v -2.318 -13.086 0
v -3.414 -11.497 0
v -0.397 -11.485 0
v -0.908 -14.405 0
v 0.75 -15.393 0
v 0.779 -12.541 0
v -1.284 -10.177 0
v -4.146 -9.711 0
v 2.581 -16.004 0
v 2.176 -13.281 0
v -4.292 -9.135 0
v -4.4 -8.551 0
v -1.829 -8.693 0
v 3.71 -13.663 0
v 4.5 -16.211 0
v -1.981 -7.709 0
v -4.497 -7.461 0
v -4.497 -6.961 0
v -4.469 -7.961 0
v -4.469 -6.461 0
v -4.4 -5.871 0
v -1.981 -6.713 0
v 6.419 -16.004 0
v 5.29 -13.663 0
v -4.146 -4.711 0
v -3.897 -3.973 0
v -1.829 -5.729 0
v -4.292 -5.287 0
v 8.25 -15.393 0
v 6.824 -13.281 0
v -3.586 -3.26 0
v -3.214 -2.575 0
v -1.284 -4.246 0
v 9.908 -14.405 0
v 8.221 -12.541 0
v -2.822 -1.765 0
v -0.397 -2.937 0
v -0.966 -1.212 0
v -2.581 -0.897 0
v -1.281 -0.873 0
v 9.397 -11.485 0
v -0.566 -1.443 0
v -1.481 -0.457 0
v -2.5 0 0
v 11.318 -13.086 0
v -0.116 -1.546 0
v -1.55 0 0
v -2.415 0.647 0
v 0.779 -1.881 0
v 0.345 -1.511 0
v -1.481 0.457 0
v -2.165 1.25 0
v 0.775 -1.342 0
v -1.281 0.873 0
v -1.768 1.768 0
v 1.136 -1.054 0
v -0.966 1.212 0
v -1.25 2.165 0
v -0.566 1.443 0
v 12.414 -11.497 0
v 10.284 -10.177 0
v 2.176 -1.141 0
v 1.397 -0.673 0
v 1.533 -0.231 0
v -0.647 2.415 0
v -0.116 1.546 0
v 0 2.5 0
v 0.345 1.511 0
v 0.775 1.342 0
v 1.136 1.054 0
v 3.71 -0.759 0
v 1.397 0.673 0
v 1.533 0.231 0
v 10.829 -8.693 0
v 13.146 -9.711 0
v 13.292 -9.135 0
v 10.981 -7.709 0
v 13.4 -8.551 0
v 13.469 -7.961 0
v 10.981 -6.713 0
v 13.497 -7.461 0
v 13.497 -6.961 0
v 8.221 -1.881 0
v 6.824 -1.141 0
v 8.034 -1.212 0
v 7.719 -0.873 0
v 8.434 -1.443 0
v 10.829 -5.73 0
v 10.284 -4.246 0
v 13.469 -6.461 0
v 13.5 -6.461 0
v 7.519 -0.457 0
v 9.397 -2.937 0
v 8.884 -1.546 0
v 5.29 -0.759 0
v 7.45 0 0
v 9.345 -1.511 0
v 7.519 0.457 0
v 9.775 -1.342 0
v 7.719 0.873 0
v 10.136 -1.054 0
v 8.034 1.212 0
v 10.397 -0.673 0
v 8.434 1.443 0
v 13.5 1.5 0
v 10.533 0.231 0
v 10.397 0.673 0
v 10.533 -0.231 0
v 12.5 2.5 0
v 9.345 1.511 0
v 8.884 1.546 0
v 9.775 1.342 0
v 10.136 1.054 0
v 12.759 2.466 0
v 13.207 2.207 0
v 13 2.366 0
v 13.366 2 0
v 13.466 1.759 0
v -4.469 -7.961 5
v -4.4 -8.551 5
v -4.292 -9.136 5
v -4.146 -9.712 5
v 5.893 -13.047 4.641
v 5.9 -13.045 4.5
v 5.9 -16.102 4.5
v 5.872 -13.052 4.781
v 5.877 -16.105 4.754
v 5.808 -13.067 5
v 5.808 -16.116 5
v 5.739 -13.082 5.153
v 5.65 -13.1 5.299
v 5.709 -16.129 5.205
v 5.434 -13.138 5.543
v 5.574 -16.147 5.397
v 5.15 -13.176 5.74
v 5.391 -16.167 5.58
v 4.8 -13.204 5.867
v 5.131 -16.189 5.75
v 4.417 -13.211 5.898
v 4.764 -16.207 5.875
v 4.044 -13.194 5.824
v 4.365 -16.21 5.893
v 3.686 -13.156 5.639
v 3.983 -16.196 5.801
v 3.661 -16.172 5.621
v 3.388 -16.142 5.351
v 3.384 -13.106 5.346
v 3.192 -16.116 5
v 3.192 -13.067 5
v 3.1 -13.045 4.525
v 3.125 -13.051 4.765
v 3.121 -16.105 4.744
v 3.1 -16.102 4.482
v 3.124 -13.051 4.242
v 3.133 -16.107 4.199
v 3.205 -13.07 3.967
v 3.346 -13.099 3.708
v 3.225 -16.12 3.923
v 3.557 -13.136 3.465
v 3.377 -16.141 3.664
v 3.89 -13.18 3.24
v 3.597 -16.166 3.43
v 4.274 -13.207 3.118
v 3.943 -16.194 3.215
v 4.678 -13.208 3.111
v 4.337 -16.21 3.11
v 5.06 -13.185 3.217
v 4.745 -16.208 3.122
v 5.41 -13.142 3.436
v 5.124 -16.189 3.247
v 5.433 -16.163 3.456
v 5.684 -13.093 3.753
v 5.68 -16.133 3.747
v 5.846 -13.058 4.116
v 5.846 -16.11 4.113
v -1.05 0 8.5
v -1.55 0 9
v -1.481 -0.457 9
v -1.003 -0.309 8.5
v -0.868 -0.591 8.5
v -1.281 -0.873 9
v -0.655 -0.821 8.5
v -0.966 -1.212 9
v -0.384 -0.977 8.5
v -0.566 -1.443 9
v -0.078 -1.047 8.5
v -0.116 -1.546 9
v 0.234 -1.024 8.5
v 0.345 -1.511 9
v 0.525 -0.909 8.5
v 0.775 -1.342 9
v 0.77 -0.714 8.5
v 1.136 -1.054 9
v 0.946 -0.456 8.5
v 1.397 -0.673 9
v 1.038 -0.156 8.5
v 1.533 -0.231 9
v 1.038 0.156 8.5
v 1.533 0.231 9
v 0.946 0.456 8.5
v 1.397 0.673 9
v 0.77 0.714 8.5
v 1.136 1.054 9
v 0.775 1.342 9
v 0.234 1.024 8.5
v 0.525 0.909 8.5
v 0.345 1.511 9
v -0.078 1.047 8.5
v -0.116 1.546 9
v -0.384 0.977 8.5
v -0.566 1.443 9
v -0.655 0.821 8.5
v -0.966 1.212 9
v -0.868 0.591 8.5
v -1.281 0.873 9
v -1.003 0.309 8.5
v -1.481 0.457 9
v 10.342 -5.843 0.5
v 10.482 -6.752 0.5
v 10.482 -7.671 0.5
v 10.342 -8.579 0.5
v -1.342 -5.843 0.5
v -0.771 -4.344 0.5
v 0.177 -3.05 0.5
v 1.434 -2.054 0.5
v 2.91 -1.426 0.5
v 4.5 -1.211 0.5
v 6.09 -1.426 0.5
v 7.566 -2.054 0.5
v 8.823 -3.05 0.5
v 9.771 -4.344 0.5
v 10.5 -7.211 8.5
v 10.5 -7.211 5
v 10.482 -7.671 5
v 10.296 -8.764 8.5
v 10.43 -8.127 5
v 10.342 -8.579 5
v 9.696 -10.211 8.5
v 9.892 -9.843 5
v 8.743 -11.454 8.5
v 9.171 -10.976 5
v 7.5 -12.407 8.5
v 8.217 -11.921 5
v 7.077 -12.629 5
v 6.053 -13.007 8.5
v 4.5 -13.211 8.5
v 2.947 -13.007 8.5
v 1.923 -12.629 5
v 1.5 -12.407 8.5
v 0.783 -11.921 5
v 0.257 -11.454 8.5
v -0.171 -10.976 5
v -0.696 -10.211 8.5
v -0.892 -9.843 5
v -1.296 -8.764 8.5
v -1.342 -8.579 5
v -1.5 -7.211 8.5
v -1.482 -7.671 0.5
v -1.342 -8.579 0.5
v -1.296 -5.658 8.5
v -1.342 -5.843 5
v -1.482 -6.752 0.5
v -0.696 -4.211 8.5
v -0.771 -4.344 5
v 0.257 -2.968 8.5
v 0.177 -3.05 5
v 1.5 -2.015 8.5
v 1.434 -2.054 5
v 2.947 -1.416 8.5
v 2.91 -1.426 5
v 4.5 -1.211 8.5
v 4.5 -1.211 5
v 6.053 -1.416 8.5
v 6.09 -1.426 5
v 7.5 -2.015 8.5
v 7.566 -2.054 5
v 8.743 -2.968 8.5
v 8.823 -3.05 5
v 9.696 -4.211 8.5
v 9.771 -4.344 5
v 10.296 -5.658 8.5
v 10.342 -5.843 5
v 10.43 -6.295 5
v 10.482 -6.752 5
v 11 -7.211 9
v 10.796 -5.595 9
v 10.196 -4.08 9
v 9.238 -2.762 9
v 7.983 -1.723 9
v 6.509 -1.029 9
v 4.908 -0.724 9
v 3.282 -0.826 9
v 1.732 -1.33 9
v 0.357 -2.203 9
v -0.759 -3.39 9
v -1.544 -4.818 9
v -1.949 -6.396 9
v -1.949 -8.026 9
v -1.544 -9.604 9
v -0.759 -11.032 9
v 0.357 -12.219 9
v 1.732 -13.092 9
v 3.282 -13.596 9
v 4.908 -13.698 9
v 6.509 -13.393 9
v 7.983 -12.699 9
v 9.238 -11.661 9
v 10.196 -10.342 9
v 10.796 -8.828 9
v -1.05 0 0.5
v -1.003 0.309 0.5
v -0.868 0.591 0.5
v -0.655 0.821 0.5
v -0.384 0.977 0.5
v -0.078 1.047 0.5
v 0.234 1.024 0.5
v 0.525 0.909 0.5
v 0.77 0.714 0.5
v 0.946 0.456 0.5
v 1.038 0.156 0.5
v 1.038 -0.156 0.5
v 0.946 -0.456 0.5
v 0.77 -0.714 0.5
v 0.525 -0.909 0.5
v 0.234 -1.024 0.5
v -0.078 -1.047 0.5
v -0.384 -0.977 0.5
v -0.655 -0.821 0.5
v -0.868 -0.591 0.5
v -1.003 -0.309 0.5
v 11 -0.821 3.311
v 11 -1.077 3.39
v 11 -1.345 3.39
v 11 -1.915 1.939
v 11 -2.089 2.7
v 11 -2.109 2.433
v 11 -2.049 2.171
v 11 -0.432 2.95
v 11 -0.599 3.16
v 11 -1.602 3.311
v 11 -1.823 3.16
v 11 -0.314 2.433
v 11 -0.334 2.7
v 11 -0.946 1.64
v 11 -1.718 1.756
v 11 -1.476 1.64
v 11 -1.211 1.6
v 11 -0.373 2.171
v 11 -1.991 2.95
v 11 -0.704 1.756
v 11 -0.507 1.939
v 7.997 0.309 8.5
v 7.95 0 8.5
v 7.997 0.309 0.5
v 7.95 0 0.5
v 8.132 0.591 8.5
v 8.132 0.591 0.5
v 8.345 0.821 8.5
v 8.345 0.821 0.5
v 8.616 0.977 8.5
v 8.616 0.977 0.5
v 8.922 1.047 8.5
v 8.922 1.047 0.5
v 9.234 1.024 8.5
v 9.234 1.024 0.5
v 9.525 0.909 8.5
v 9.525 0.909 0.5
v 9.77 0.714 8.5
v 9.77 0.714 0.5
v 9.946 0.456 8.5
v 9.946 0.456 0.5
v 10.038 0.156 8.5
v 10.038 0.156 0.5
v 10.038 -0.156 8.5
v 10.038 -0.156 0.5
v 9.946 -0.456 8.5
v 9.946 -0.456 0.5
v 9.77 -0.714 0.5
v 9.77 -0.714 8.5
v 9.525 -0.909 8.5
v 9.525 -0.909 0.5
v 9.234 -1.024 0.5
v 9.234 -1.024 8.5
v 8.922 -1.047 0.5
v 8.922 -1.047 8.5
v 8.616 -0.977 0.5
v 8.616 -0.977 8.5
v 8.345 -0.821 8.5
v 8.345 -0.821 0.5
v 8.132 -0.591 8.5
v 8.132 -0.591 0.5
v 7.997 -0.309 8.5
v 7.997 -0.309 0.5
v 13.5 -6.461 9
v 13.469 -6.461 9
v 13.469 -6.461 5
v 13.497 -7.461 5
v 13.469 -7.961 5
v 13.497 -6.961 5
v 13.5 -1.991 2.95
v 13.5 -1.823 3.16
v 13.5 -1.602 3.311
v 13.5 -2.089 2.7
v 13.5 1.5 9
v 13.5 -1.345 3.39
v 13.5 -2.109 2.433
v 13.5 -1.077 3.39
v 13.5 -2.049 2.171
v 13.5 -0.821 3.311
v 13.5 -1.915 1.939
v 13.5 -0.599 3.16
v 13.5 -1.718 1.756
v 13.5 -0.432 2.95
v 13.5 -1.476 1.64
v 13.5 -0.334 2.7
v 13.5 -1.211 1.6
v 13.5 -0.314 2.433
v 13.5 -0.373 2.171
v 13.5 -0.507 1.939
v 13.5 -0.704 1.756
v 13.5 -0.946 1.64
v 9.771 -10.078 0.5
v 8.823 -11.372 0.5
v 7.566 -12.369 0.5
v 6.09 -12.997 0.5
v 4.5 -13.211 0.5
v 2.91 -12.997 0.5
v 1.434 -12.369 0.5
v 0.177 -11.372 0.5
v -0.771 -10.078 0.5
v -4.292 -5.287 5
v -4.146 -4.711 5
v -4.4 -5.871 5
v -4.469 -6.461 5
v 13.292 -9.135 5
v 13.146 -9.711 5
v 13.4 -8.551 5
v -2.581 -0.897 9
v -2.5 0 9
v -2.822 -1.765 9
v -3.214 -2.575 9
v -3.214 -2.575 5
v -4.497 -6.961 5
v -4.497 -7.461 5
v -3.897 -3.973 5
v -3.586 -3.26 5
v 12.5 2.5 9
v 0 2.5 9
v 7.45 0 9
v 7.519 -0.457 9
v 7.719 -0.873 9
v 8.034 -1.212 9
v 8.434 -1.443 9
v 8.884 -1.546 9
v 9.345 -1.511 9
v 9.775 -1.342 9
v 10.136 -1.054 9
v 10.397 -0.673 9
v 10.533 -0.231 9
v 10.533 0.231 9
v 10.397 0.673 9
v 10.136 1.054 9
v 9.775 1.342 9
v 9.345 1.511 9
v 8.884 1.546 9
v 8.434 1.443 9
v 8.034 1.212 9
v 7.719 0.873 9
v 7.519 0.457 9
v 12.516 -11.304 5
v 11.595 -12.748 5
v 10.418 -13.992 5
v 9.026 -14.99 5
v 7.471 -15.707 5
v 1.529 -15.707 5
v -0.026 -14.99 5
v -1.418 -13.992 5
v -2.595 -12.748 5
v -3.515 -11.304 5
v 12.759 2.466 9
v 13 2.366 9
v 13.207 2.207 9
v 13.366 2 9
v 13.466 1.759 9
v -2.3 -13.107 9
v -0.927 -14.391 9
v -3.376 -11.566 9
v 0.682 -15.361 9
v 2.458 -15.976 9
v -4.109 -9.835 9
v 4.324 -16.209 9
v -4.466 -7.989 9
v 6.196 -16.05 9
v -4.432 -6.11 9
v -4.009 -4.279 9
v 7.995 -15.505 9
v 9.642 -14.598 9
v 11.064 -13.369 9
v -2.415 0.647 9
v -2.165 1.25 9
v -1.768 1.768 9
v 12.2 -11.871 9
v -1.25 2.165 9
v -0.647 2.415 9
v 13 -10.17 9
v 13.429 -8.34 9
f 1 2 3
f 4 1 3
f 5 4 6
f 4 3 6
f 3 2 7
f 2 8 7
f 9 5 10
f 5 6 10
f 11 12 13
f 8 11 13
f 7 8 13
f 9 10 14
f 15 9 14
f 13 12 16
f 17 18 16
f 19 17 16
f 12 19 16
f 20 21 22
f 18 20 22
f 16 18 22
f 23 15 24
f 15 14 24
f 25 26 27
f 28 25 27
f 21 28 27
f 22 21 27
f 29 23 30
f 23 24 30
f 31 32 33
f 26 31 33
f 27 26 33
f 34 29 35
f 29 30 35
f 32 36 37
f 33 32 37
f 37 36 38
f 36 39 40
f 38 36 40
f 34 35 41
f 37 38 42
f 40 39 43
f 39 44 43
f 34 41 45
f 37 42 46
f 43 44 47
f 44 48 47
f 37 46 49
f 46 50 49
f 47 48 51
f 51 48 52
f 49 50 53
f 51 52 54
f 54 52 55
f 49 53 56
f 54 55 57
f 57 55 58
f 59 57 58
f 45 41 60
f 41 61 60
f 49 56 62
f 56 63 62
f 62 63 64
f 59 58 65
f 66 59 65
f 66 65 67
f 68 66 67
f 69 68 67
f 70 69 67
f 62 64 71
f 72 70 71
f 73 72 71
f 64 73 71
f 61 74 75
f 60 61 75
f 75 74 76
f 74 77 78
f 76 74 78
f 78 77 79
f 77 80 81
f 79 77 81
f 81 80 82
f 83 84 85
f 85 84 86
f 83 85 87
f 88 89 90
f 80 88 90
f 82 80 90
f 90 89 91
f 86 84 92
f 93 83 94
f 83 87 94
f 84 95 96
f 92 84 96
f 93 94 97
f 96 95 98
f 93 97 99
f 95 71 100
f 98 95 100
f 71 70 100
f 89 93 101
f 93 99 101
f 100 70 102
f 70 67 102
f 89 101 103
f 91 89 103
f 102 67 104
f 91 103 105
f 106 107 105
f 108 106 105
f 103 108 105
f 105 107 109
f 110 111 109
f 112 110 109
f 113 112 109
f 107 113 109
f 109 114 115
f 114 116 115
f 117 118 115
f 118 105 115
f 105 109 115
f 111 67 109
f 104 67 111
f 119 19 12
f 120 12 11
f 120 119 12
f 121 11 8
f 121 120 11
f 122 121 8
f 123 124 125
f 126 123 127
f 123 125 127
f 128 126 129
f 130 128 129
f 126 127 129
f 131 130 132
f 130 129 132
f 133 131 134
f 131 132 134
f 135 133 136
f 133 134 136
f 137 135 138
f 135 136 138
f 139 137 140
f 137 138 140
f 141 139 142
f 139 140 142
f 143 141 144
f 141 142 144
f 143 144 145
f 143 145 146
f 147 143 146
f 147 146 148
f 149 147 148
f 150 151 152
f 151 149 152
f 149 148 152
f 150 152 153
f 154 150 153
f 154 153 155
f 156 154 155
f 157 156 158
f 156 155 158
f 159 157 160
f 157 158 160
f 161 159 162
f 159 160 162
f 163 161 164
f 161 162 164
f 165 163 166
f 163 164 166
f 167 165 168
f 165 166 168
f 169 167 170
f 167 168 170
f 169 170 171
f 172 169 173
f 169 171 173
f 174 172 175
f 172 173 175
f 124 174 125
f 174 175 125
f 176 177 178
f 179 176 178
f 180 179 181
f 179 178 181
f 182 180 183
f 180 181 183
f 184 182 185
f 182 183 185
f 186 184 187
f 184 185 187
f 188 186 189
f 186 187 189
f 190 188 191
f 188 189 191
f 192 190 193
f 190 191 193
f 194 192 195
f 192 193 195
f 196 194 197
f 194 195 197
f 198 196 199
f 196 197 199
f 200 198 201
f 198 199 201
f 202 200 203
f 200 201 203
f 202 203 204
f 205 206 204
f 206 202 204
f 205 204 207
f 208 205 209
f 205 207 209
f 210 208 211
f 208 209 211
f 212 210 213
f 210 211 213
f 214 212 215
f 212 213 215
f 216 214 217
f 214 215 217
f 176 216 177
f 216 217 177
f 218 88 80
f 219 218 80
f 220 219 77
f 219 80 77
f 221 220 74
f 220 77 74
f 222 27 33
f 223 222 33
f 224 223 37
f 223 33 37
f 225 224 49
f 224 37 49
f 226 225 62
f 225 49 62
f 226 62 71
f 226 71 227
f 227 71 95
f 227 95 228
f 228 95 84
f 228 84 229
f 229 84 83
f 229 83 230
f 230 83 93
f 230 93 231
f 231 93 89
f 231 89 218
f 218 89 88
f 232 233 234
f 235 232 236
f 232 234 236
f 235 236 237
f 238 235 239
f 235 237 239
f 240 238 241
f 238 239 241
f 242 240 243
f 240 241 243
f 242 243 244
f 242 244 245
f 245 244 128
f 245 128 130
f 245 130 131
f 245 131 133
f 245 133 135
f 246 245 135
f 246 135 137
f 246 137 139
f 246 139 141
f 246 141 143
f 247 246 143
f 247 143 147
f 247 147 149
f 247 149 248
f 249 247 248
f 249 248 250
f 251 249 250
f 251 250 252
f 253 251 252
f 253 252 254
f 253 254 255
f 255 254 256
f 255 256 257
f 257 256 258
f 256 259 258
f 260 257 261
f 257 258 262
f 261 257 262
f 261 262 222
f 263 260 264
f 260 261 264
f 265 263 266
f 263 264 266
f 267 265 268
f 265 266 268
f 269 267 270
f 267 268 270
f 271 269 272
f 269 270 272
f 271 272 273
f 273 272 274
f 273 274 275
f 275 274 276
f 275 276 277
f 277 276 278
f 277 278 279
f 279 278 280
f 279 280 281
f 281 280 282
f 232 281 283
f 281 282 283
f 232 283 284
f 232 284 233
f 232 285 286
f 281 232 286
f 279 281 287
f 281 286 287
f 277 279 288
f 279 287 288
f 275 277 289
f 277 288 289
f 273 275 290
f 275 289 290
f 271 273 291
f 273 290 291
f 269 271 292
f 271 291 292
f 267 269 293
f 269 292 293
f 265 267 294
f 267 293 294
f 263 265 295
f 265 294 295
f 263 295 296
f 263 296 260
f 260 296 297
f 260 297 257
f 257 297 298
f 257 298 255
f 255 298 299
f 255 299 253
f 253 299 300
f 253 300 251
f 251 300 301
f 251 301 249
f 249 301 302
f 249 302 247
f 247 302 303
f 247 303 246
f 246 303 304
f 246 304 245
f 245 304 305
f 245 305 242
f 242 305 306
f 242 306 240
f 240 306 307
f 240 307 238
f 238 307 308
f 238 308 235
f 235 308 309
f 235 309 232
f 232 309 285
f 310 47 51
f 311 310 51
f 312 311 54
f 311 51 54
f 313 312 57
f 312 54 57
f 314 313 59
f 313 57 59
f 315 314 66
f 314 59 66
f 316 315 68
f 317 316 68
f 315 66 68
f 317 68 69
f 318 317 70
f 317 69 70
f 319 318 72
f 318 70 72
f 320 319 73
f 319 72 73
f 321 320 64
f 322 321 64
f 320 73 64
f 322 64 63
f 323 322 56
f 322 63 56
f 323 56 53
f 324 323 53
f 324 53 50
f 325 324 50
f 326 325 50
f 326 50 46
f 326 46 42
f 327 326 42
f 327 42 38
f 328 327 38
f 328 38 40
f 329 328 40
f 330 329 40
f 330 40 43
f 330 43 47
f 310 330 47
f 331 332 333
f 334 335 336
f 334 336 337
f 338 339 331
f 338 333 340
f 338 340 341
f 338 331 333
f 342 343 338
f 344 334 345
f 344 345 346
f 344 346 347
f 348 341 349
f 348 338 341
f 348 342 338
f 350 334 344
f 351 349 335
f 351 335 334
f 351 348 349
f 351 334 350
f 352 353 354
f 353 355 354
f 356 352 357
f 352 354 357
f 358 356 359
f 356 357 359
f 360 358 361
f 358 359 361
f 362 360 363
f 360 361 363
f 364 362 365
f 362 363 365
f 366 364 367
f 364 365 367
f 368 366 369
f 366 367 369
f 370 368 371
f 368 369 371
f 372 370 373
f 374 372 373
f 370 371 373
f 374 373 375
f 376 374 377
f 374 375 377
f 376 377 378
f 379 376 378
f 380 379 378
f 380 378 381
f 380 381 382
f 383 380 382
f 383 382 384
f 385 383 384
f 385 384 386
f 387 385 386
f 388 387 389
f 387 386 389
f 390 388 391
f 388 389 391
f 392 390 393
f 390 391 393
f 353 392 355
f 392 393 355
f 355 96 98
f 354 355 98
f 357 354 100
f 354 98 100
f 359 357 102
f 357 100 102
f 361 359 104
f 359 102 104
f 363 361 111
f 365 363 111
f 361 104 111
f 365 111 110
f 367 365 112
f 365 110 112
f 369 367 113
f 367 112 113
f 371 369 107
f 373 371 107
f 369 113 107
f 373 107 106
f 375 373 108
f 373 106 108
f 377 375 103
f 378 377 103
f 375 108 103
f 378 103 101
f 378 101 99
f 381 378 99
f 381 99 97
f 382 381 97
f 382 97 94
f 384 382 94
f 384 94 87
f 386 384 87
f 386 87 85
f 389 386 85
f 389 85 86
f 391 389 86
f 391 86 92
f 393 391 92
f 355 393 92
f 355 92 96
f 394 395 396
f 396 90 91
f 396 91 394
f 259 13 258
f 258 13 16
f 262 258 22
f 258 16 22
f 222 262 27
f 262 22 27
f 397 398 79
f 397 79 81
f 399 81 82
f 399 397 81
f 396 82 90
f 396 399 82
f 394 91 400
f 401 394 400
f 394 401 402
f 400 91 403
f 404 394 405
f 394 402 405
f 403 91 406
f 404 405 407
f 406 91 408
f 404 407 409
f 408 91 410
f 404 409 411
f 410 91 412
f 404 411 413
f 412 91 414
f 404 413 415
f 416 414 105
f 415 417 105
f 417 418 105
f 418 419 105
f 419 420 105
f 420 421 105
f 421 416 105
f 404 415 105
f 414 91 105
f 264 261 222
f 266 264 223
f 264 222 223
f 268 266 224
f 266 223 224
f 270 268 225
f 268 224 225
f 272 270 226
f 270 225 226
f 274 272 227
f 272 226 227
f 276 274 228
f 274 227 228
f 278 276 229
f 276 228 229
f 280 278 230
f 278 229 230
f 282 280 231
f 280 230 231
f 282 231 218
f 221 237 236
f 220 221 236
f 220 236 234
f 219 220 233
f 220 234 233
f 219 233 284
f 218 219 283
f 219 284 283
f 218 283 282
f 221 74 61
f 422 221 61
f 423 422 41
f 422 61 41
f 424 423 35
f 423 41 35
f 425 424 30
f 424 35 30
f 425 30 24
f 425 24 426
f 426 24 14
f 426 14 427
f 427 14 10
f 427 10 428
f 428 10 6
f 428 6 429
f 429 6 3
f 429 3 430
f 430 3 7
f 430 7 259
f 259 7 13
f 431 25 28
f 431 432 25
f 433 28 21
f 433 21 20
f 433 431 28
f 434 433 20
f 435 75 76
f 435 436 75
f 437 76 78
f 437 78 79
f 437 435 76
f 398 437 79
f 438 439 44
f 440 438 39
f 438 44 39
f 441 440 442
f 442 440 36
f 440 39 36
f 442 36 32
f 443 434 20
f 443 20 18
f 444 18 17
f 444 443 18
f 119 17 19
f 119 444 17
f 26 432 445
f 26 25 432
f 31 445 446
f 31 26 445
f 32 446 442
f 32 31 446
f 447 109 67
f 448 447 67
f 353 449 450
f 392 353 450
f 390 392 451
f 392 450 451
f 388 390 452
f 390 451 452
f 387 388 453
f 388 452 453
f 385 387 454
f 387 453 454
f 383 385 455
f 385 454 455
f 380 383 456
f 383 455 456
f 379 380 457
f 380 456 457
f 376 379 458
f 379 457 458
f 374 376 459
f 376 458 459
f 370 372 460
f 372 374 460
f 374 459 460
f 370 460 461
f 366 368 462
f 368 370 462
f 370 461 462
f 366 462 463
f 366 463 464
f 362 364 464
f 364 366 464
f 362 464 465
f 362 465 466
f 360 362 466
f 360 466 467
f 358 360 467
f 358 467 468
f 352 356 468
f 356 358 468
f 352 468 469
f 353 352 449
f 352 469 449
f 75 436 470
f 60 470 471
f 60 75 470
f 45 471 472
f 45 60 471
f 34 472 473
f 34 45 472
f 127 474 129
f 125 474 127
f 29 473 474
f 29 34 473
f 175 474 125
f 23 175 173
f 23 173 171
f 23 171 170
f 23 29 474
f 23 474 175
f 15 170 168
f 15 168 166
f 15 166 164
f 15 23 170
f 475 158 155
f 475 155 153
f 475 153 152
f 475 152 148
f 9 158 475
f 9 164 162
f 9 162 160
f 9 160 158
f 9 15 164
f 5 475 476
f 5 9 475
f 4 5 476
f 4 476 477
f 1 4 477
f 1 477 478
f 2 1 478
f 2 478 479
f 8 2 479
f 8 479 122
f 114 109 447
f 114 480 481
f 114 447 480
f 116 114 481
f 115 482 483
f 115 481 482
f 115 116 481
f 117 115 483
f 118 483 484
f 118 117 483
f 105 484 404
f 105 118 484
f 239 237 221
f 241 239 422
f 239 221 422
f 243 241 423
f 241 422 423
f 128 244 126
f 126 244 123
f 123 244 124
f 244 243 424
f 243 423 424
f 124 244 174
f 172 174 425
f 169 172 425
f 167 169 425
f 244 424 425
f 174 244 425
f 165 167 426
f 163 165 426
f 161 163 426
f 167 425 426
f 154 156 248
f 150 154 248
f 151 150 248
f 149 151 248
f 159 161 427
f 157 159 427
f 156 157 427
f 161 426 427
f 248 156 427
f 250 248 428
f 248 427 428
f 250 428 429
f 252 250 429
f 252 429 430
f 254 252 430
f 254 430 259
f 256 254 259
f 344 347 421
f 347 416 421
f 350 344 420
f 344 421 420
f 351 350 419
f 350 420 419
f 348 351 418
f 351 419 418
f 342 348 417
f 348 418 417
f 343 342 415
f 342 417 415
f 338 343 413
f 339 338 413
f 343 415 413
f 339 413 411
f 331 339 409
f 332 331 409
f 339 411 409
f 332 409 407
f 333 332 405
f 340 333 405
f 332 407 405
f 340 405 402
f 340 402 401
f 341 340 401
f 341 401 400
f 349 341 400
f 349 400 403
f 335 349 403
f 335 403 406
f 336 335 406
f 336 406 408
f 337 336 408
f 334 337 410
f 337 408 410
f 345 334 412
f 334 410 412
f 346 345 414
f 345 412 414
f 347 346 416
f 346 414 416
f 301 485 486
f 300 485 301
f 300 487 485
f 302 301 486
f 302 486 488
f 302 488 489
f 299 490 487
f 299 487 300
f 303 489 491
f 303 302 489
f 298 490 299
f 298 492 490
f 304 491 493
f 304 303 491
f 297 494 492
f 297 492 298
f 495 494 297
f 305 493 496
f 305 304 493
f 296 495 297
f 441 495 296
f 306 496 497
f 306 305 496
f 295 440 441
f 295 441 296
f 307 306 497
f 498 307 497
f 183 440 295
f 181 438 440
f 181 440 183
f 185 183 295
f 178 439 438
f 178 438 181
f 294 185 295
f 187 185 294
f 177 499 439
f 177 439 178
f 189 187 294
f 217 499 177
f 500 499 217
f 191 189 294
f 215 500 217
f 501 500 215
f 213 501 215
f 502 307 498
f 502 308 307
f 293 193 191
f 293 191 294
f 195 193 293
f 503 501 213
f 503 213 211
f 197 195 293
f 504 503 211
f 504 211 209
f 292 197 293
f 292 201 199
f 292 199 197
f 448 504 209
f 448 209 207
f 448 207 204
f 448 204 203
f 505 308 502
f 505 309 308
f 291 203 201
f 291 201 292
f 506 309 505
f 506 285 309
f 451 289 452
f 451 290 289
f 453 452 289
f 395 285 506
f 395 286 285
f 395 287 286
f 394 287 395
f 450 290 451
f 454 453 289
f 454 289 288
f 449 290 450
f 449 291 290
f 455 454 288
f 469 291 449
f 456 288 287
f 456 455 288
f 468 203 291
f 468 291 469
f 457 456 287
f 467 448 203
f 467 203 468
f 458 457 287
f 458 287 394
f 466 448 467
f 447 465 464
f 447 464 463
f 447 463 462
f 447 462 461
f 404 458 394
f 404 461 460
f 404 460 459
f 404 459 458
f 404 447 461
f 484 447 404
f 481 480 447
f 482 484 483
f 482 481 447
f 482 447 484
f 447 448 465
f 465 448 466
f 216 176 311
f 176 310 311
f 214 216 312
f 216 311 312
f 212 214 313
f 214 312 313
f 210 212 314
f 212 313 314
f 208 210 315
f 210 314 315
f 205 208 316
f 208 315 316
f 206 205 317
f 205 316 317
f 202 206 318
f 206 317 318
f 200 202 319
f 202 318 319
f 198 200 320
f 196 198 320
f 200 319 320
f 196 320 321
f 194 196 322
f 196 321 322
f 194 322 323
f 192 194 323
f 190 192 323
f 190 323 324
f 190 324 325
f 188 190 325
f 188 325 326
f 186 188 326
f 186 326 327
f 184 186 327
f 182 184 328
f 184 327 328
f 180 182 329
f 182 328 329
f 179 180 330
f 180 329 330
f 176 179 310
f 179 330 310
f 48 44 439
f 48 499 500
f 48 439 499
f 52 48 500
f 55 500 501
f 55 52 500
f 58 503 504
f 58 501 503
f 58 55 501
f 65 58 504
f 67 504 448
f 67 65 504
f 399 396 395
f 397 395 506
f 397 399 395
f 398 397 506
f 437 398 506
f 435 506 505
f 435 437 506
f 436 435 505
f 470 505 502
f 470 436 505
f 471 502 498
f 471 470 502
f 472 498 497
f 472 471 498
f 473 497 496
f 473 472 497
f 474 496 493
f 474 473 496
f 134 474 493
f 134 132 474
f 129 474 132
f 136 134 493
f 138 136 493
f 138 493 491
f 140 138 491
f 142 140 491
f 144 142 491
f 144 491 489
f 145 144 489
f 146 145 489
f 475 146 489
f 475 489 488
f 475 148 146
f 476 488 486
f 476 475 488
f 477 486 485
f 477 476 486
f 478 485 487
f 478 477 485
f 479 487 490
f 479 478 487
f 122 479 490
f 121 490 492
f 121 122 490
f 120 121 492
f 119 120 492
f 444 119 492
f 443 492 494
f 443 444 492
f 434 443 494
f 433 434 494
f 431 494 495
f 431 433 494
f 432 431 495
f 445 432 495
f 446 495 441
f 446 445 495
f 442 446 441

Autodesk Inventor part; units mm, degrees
ref_plane "YZ Plane" through (0, 0, 0) normal (1, 0, 0) x (0, 1, 0)
ref_plane "XZ Plane" through (0, 0, 0) normal (0, 1, 0) x (-1, 0, 0)
sketch "Sketch1" plane through (0, 0, 0) normal (0, 0, 1) x (1, 0, 0)
  circle A0 centre (9, 0) radius 1
  circle A1 centre (0, 0) radius 1
  line L0 (0, 2.5) -> (9, 2.5)
  arc A2 (0, 2.5) -> (-2.5, 0) centre (0, 0) ccw
  arc A3 (11.5, 0) -> (9, 2.5) centre (9, 0) ccw
  arc A4 (-3.2143, -2.5754) -> (-2.5, 0) centre (-7.5, 0) ccw
  arc A5 (11.5, 0) -> (12.2143, -2.5754) centre (16.5, 0) ccw
  arc A6 (-3.2143, -2.5754) -> (-4.1458, -4.7111) centre (4.5, -7.2111) ccw
  line L1 (-8.5, -4.7111) -> (-4.1458, -4.7111)
  line L2 (13.1458, -4.7111) -> (17.5, -4.7111)
  line L3 (17.5, -9.7111) -> (13.1458, -9.7111)
  line L4 (-4.1458, -9.7111) -> (-8.5, -9.7111)
  line L5 (17.5, -7.9611) -> (10.4529, -7.9611)
  line L6 (-1.4529, -7.9611) -> (-8.5, -7.9611)
  line L7 (-8.5, -6.4611) -> (-1.4529, -6.4611)
  line L8 (10.4529, -6.4611) -> (17.5, -6.4611)
  arc A7 (-4.1458, -9.7111) -> (13.1458, -9.7111) centre (4.5, -7.2111) ccw
  arc A8 (13.1458, -4.7111) -> (12.2143, -2.5754) centre (4.5, -7.2111) ccw
  arc A9 (-1.4529, -7.9611) -> (10.4529, -7.9611) centre (4.5, -7.2111) ccw
  arc A10 (10.4529, -6.4611) -> (-1.4529, -6.4611) centre (4.5, -7.2111) ccw
  line L9 (17.5, -4.7111) -> (17.5, -6.4611)
  line L10 (17.5, -7.9611) -> (17.5, -9.7111)
  line L11 (-8.5, -9.7111) -> (-8.5, -7.9611)
  line L12 (-8.5, -6.4611) -> (-8.5, -4.7111)
extrude "Extrusion1" add sketch "Sketch1" along normal blind 5
sketch "Sketch2" plane through (13.1458, -9.7111, 0) normal (0, -1, 0) x (1, 0, 0)
  line L0 (4.3542, 0) -> (4.3542, 5) projected
  line L1 (0, 0) -> (0, 5) projected
  circle A0 centre (2.1771, 2.5) radius 0.9
  circle A1 centre (-19.4687, 2.5) radius 0.9
  point P0 (-13.1458, 0)
  dimension "d13" = 1.8
extrude "Extrusion2" cut sketch "Sketch2" against normal blind 5
fillet "Fillet1" radius 0.8 8 edges at (17.5, -4.7111, 2.5) (17.5, -9.7111, 2.5) (-8.5, -4.7111, 2.5) (-8.5, -9.7111, 2.5) (17.5, -6.4611, 2.5) (17.5, -7.9611, 2.5) (-8.5, -7.9611, 2.5) (-8.5, -6.4611, 2.5)
fillet "Fillet2" radius 0.8 4 edges at (-1.4529, -6.4611, 2.5) (10.4529, -6.4611, 2.5) (10.4529, -7.9611, 2.5) (-1.4529, -7.9611, 2.5)
sketch "Sketch3" plane through (0, 0, 5) normal (0, 0, 1) x (1, 0, 0)
  arc A0 (11.5, 0) -> (9, 2.5) centre (9, 0) ccw projected
  line L0 (14.4229, -6.4611) -> (14.4229, -4.7111) projected
  line L1 (9, 2.5) -> (14.4229, 2.5)
  line L2 (14.4229, 2.5) -> (14.4229, -4.7111)
  line L3 (14.4229, -4.7111) -> (9, -4.7111)
  line L4 (9, -4.7111) -> (9, 2.5)
  arc A1 (13.1458, -4.7111) -> (12.2143, -2.5754) centre (4.5, -7.2111) ccw projected
  arc A2 (11.5, 0) -> (12.2143, -2.5754) centre (16.5, 0) ccw projected
  point P0 (0, 0)
extrude "Extrusion3" add sketch "Sketch3" against normal blind 5 contours A0 L1 L2 L3 A1 A2
sketch "Sketch4" plane through (14.4229, -4.7111, 5) normal (1, 0, 0) x (0, 0, -1)
  line L0 (0, 0) -> (0, 7.2111) projected
  line L1 (2.5, 0) -> (0, 0) projected
  line L2 (5, 0) -> (2.5, 0) projected
  line L3 (5, 7.2111) -> (5, 0) projected
  line L4 (0, 7.2111) -> (5, 7.2111) projected
  point P0 (5, 4.7111)
extrude "Extrusion4" cut sketch "Sketch4" against normal blind 0.923
sketch "Sketch5" plane through (13.4999, -4.7111, 5) normal (1, 0, 0) x (0, 0, -1)
  line L0 (0, 3.5) -> (5, 3.5) projected
  circle A0 centre (2.5, 3.5) radius 0.9
  point P0 (5, 4.7111)
  dimension "d25" = 1.8
extrude "Extrusion5" cut sketch "Sketch5" against normal blind 2.5
fillet "Fillet3" radius 1 1 edges at (13.4999, 2.5, 2.5)
sketch "Sketch6" plane through (0, 0, 5) normal (0, 0, 1) x (1, 0, 0)
  arc A0 (-1.342, -8.5787) -> (10.342, -8.5787) centre (4.5, -7.2111) ccw projected
  circle A1 centre (4.5, -7.2111) radius 6
  circle A2 centre (4.5, -7.2111) radius 9
  line L0 (13.4999, -4.7111) -> (13.4999, 1.5) projected
  line L1 (13.4999, -4.7111) -> (17.88, -4.7111)
  line L2 (17.88, -4.7111) -> (17.88, -10.4948)
  line L3 (17.88, -10.4948) -> (13.4999, -10.4948)
  line L4 (13.4999, -10.4948) -> (13.4999, -4.7111)
  line L5 (-4.1458, -4.7111) -> (-7.7, -4.7111) projected
  line L6 (-4.1458, -4.7111) -> (-9.7441, -4.7111)
  line L7 (-9.7441, -4.7111) -> (-9.7441, -9.7121)
  line L8 (-9.7441, -9.7121) -> (-4.1458, -9.7121)
  line L9 (-4.1458, -9.7121) -> (-4.1458, -4.7111)
  line L10 (13.4999, -10.4948) -> (12.8796, -10.4948)
  point P0 (0, 0)
  point P1 (-4.1458, -9.7111)
  point P2 (13.4999, -7.1696)
extrude "Extrusion6" cut sketch "Sketch6" against normal blind 10 contours L4 L10 A2 | L4 L1 L2 L3 | A2 L8 L7 L6 L5
sketch "Sketch7" plane through (0, 0, 5) normal (0, 0, 1) x (1, 0, 0)
  arc A0 (-1.342, -8.5787) -> (10.342, -8.5787) centre (4.5, -7.2111) ccw projected
  circle A1 centre (4.5, -7.2111) radius 6
  circle A2 centre (4.5, -7.2111) radius 9
  line L0 (-4.4687, -6.4611) -> (-2.121, -6.4611) projected
  arc A3 (-2.121, -6.4611) -> (-1.342, -5.8435) centre (-2.121, -5.6611) ccw projected
  line L1 (-2.121, -7.9611) -> (-4.4687, -7.9611) projected
  arc A4 (-1.342, -8.5787) -> (-2.121, -7.9611) centre (-2.121, -8.7611) ccw projected
  line L2 (11.121, -6.4611) -> (13.4999, -6.4611) projected
  arc A5 (10.342, -5.8435) -> (11.121, -6.4611) centre (11.121, -5.6611) ccw projected
  arc A6 (11.121, -7.9611) -> (10.342, -8.5787) centre (11.121, -8.7611) ccw projected
  line L3 (13.4687, -7.9611) -> (11.121, -7.9611) projected
  point P0 (0, 0)
  point P1 (13.4687, -6.4611)
  point P2 (10.342, -8.5787)
  point P3 (-1.342, -8.5787)
extrude "Extrusion7" add sketch "Sketch7" against normal up to surface (5 mm away) contours A4 L1 A2 L0 A3 A1 | A1 A5 L2 A2 L3 A6
sketch "Sketch8" plane through (0, 0, 5) normal (0, 0, 1) x (1, 0, 0)
  circle A0 centre (4.5, -7.2111) radius 6 projected
  circle A1 centre (0, 0) radius 1 projected
  circle A2 centre (9, 0) radius 1 projected
  arc A3 (-3.2143, -2.5754) -> (13.4687, -6.4611) centre (4.5, -7.2111) ccw projected
  line L0 (13.4687, -6.4611) -> (13.4999, -6.4611) projected
  line L1 (13.4999, -6.4611) -> (13.4999, 1.5) projected
  arc A4 (13.4999, 1.5) -> (12.4999, 2.5) centre (12.4999, 1.5) ccw projected
  line L2 (12.4999, 2.5) -> (0, 2.5) projected
  arc A5 (0, 2.5) -> (-2.5, 0) centre (0, 0) ccw projected
  arc A6 (-3.2143, -2.5754) -> (-2.5, 0) centre (-7.5, 0) ccw projected
extrude "Extrusion8" add sketch "Sketch8" along normal blind 4
ref_plane "Work Plane1" through (0, -22.25, 0) normal (0, 1, 0) x (1, 0, 0)
sketch "Sketch9" plane through (0, -22.25, 0) normal (0, 1, 0) x (1, 0, 0)
  line L0 (-4.5, -9) -> (13.5, -9) projected
  line L1 (13.5, 0) -> (13.5, -9) projected
  circle A0 centre (4.5, -4.5) radius 1.4
  point P0 (0, 0)
  point P1 (-3.2143, -9)
  point P2 (13.4687, -9)
  dimension "d36" = 2.8
extrude "Extrusion9" cut sketch "Sketch9" along normal blind 10
chamfer "Chamfer2" distance 0.5 angle 45 2 edges at (4.5, -13.2111, 0) (-1.5, -7.2111, 9)
sketch "Sketch10" plane through (0, 0, 0) normal (0, 0, -1) x (-1, 0, 0)
  circle A0 centre (0, 0) radius 1.05
  circle A1 centre (-9, 0) radius 1 projected
  circle A2 centre (-9, 0) radius 1.05
  dimension "d42" = 2.1
  dimension "d43" = 2.1
extrude "Extrusion10" cut sketch "Sketch10" against normal blind 10
chamfer "Chamfer3" distance 0.5 angle 45 4 edges at (1.05, 0, 0) (10.05, 0, 0) (1.05, 0, 9) (10.05, 0, 9)
properties part number "hold pen - slider pen"
